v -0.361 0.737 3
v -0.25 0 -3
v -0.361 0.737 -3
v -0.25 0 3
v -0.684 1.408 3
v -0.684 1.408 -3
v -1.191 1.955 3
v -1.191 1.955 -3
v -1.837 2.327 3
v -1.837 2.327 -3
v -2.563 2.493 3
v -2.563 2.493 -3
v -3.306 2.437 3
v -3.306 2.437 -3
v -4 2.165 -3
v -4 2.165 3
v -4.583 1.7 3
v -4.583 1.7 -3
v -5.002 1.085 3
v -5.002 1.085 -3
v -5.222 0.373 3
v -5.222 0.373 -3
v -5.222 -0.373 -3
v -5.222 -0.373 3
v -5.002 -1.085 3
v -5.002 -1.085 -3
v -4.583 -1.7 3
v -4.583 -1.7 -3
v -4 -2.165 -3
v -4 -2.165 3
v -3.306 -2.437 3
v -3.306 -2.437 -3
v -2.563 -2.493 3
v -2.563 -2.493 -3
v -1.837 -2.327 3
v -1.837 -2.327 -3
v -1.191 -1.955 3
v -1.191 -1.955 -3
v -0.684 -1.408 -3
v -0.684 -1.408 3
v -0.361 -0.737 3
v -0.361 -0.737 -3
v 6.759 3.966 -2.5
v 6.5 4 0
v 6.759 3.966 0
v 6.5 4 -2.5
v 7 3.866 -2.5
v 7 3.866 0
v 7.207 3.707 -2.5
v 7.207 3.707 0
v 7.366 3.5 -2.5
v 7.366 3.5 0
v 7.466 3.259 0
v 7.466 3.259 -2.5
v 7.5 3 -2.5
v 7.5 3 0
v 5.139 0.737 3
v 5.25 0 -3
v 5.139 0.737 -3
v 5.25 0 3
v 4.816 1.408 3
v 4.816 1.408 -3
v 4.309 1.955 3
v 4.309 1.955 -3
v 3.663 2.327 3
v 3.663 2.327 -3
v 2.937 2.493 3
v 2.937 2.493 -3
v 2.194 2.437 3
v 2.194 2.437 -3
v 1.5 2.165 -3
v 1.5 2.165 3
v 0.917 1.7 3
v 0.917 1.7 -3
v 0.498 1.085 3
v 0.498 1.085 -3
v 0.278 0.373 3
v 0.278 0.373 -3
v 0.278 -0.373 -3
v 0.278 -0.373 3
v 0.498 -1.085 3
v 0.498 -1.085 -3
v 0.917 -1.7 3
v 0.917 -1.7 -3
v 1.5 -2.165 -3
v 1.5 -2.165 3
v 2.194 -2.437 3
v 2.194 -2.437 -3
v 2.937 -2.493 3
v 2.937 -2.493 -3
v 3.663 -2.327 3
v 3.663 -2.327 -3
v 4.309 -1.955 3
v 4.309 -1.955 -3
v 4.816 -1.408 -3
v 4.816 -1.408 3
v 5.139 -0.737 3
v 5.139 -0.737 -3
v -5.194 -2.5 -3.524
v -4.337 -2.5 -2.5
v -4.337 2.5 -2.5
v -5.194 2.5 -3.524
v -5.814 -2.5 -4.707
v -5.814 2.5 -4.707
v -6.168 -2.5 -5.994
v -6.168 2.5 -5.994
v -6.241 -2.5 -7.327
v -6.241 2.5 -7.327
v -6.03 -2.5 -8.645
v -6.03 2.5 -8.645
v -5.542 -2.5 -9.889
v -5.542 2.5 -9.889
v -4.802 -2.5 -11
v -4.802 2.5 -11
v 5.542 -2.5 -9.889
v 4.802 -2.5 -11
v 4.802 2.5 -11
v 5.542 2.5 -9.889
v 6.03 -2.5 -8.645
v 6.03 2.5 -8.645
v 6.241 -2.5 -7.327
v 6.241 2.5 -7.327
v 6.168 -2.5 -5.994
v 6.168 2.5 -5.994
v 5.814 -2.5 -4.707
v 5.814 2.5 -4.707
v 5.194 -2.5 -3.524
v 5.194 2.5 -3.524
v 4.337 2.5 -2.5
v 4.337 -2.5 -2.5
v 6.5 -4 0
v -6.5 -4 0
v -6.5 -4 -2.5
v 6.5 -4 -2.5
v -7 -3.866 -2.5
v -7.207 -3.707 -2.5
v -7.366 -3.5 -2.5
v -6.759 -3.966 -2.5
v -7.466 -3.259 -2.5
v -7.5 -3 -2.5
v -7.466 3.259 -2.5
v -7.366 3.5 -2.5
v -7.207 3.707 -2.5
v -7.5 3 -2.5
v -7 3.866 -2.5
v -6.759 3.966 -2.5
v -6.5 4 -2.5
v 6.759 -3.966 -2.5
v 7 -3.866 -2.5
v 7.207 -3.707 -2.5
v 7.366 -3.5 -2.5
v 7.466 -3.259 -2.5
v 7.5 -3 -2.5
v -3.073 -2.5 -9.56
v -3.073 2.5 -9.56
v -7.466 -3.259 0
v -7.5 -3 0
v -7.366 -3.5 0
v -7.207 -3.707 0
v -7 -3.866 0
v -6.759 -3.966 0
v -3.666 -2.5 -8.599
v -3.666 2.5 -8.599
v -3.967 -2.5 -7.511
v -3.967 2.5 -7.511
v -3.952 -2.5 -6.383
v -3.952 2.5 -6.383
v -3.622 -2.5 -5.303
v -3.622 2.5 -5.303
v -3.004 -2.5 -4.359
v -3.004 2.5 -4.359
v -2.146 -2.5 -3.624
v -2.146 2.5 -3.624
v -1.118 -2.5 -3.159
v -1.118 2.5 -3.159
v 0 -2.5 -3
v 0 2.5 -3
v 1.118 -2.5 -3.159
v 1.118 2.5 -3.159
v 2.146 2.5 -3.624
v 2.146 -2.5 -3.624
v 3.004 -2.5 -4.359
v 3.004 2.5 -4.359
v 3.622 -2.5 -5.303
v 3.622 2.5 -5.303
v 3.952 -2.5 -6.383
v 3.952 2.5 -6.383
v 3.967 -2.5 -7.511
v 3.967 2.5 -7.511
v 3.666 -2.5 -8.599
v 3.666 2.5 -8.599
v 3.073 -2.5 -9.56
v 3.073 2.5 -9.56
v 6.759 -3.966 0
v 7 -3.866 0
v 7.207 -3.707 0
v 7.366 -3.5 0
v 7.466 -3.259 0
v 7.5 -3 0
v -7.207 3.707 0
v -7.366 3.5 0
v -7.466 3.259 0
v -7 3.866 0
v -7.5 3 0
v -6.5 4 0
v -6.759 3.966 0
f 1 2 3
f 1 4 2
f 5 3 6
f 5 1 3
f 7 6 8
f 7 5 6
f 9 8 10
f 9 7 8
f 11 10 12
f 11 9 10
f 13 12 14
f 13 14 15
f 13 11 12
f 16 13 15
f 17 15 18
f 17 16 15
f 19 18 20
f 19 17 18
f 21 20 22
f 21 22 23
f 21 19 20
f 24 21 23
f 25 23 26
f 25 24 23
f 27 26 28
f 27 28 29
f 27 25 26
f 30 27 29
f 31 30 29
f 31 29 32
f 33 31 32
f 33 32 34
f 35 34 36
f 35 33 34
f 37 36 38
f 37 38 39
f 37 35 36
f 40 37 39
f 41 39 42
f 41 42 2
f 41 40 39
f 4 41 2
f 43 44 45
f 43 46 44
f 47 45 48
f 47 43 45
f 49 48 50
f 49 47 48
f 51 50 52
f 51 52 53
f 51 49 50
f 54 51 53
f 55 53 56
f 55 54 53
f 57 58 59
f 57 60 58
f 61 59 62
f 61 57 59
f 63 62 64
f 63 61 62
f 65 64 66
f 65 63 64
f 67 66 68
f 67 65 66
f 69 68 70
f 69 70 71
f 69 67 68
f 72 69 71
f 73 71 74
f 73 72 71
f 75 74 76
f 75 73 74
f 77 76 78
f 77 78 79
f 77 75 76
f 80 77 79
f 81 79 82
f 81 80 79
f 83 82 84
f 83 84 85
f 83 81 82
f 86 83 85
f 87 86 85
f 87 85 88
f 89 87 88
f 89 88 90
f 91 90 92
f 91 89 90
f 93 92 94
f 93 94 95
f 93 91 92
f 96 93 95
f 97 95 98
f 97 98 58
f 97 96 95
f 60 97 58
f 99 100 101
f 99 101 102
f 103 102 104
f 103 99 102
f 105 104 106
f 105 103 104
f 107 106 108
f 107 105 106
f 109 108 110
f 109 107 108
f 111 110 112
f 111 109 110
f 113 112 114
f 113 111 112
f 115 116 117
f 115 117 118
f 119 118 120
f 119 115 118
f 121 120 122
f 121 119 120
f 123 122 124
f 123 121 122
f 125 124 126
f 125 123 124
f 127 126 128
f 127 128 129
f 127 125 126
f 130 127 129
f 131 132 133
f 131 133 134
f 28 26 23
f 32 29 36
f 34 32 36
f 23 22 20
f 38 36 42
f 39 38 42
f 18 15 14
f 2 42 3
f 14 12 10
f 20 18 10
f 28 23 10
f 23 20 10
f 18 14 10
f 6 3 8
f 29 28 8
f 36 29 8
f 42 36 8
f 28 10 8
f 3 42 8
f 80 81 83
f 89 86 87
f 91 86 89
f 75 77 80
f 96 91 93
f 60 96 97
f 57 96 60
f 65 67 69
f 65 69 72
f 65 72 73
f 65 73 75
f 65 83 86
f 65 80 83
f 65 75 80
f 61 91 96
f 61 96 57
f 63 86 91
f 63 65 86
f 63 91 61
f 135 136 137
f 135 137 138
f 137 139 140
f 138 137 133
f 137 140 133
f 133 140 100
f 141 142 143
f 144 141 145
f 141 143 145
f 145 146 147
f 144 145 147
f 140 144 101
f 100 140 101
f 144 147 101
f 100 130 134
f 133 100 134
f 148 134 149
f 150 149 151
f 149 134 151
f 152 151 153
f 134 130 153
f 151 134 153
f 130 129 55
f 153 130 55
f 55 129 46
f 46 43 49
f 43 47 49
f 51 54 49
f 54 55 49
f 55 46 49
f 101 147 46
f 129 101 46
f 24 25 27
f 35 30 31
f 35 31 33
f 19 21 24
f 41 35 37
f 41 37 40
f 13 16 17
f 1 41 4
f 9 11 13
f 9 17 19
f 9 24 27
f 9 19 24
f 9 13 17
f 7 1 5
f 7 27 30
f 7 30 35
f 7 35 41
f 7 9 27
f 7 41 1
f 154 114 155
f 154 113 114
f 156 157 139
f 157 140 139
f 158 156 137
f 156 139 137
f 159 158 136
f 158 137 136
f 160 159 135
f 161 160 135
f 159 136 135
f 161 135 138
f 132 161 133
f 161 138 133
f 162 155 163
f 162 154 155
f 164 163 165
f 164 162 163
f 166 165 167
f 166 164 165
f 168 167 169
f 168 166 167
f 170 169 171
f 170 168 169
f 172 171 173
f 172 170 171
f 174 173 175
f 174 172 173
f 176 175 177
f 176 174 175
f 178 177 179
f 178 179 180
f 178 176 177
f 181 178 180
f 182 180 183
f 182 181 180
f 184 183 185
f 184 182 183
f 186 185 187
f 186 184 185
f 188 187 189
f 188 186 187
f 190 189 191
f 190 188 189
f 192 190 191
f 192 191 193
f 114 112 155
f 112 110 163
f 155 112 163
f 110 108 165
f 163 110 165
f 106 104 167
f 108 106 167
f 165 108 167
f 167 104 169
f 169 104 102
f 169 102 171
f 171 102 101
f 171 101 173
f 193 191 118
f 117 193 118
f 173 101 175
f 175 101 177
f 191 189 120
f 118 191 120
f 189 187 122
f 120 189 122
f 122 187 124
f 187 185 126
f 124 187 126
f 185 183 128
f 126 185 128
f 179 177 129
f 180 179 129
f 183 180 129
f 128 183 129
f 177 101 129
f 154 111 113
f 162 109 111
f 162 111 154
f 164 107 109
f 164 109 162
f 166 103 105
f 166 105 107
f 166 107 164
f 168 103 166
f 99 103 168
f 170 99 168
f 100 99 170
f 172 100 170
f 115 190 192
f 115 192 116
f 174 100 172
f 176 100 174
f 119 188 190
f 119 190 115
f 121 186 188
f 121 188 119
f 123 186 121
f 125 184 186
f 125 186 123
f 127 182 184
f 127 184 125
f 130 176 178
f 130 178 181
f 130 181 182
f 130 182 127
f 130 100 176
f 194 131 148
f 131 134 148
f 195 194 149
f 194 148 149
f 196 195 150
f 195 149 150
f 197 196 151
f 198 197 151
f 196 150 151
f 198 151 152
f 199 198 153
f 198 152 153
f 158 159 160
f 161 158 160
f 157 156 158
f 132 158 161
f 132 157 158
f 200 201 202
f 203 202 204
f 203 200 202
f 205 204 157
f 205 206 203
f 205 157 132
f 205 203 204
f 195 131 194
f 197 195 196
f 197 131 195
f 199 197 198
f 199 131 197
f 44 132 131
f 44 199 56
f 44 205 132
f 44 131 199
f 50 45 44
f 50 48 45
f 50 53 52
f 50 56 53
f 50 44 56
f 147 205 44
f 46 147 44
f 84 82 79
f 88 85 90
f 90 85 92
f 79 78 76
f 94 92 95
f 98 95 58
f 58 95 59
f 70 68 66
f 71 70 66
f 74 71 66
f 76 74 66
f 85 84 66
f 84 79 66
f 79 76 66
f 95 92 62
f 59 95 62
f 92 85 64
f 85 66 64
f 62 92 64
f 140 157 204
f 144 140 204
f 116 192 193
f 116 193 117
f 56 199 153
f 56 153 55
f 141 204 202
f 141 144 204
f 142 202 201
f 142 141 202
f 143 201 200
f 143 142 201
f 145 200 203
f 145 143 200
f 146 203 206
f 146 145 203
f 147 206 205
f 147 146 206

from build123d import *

# Parameters (mm, degrees)
F0_R     = 2.5
F1_DEPTH = 3
F2_W     = 15
F2_H     = 8
F3_DEPTH = 2.5
F5_DEPTH = 2.5
F6_R     = 1


with BuildPart() as f1:
    # F0 (on Top) → F1 (new body, symmetric)
    with BuildSketch(Plane.XY):
        with Locations((-2.75, 0)):
            Circle(F0_R)
    extrude(amount=F1_DEPTH, both=True)


with BuildPart() as f1b:
    # F0 (on Top) → F1, piece 2 (new body, symmetric)
    with BuildSketch(Plane.XY):
        with Locations((2.75, 0)):
            Circle(F0_R)
    extrude(amount=F1_DEPTH, both=True)


with BuildPart() as f3:
    # F2 (on Top) → F3 (new body)
    with BuildSketch(Plane.XY):
        Rectangle(F2_W, F2_H)
    extrude(amount=-F3_DEPTH)

    # F4 (on Front) → F5 (join, symmetric)
    with BuildSketch(Plane.XZ):
        with BuildLine():
            ThreePointArc((-3.073499634, -9.56), (0, -3), (3.073499634, -9.56))
            Line((3.073499634, -9.56), (4.8023431781, -11))
            ThreePointArc((4.8023431781, -11), (0, -0.75), (-4.8023431781, -11))
            Line((-4.8023431781, -11), (-3.073499634, -9.56))
        make_face()
    extrude(amount=F5_DEPTH, both=True)

    # F6
    f6_edges = [f3.edges().sort_by_distance(p)[0] for p in [
        (7.5, -4, -1.25),
        (-7.5, -4, -1.25),
        (7.5, 4, -1.25),
        (-7.5, 4, -1.25),
    ]]
    fillet(f6_edges, radius=F6_R)


solid = Compound([f1.part, f1b.part, f3.part])
